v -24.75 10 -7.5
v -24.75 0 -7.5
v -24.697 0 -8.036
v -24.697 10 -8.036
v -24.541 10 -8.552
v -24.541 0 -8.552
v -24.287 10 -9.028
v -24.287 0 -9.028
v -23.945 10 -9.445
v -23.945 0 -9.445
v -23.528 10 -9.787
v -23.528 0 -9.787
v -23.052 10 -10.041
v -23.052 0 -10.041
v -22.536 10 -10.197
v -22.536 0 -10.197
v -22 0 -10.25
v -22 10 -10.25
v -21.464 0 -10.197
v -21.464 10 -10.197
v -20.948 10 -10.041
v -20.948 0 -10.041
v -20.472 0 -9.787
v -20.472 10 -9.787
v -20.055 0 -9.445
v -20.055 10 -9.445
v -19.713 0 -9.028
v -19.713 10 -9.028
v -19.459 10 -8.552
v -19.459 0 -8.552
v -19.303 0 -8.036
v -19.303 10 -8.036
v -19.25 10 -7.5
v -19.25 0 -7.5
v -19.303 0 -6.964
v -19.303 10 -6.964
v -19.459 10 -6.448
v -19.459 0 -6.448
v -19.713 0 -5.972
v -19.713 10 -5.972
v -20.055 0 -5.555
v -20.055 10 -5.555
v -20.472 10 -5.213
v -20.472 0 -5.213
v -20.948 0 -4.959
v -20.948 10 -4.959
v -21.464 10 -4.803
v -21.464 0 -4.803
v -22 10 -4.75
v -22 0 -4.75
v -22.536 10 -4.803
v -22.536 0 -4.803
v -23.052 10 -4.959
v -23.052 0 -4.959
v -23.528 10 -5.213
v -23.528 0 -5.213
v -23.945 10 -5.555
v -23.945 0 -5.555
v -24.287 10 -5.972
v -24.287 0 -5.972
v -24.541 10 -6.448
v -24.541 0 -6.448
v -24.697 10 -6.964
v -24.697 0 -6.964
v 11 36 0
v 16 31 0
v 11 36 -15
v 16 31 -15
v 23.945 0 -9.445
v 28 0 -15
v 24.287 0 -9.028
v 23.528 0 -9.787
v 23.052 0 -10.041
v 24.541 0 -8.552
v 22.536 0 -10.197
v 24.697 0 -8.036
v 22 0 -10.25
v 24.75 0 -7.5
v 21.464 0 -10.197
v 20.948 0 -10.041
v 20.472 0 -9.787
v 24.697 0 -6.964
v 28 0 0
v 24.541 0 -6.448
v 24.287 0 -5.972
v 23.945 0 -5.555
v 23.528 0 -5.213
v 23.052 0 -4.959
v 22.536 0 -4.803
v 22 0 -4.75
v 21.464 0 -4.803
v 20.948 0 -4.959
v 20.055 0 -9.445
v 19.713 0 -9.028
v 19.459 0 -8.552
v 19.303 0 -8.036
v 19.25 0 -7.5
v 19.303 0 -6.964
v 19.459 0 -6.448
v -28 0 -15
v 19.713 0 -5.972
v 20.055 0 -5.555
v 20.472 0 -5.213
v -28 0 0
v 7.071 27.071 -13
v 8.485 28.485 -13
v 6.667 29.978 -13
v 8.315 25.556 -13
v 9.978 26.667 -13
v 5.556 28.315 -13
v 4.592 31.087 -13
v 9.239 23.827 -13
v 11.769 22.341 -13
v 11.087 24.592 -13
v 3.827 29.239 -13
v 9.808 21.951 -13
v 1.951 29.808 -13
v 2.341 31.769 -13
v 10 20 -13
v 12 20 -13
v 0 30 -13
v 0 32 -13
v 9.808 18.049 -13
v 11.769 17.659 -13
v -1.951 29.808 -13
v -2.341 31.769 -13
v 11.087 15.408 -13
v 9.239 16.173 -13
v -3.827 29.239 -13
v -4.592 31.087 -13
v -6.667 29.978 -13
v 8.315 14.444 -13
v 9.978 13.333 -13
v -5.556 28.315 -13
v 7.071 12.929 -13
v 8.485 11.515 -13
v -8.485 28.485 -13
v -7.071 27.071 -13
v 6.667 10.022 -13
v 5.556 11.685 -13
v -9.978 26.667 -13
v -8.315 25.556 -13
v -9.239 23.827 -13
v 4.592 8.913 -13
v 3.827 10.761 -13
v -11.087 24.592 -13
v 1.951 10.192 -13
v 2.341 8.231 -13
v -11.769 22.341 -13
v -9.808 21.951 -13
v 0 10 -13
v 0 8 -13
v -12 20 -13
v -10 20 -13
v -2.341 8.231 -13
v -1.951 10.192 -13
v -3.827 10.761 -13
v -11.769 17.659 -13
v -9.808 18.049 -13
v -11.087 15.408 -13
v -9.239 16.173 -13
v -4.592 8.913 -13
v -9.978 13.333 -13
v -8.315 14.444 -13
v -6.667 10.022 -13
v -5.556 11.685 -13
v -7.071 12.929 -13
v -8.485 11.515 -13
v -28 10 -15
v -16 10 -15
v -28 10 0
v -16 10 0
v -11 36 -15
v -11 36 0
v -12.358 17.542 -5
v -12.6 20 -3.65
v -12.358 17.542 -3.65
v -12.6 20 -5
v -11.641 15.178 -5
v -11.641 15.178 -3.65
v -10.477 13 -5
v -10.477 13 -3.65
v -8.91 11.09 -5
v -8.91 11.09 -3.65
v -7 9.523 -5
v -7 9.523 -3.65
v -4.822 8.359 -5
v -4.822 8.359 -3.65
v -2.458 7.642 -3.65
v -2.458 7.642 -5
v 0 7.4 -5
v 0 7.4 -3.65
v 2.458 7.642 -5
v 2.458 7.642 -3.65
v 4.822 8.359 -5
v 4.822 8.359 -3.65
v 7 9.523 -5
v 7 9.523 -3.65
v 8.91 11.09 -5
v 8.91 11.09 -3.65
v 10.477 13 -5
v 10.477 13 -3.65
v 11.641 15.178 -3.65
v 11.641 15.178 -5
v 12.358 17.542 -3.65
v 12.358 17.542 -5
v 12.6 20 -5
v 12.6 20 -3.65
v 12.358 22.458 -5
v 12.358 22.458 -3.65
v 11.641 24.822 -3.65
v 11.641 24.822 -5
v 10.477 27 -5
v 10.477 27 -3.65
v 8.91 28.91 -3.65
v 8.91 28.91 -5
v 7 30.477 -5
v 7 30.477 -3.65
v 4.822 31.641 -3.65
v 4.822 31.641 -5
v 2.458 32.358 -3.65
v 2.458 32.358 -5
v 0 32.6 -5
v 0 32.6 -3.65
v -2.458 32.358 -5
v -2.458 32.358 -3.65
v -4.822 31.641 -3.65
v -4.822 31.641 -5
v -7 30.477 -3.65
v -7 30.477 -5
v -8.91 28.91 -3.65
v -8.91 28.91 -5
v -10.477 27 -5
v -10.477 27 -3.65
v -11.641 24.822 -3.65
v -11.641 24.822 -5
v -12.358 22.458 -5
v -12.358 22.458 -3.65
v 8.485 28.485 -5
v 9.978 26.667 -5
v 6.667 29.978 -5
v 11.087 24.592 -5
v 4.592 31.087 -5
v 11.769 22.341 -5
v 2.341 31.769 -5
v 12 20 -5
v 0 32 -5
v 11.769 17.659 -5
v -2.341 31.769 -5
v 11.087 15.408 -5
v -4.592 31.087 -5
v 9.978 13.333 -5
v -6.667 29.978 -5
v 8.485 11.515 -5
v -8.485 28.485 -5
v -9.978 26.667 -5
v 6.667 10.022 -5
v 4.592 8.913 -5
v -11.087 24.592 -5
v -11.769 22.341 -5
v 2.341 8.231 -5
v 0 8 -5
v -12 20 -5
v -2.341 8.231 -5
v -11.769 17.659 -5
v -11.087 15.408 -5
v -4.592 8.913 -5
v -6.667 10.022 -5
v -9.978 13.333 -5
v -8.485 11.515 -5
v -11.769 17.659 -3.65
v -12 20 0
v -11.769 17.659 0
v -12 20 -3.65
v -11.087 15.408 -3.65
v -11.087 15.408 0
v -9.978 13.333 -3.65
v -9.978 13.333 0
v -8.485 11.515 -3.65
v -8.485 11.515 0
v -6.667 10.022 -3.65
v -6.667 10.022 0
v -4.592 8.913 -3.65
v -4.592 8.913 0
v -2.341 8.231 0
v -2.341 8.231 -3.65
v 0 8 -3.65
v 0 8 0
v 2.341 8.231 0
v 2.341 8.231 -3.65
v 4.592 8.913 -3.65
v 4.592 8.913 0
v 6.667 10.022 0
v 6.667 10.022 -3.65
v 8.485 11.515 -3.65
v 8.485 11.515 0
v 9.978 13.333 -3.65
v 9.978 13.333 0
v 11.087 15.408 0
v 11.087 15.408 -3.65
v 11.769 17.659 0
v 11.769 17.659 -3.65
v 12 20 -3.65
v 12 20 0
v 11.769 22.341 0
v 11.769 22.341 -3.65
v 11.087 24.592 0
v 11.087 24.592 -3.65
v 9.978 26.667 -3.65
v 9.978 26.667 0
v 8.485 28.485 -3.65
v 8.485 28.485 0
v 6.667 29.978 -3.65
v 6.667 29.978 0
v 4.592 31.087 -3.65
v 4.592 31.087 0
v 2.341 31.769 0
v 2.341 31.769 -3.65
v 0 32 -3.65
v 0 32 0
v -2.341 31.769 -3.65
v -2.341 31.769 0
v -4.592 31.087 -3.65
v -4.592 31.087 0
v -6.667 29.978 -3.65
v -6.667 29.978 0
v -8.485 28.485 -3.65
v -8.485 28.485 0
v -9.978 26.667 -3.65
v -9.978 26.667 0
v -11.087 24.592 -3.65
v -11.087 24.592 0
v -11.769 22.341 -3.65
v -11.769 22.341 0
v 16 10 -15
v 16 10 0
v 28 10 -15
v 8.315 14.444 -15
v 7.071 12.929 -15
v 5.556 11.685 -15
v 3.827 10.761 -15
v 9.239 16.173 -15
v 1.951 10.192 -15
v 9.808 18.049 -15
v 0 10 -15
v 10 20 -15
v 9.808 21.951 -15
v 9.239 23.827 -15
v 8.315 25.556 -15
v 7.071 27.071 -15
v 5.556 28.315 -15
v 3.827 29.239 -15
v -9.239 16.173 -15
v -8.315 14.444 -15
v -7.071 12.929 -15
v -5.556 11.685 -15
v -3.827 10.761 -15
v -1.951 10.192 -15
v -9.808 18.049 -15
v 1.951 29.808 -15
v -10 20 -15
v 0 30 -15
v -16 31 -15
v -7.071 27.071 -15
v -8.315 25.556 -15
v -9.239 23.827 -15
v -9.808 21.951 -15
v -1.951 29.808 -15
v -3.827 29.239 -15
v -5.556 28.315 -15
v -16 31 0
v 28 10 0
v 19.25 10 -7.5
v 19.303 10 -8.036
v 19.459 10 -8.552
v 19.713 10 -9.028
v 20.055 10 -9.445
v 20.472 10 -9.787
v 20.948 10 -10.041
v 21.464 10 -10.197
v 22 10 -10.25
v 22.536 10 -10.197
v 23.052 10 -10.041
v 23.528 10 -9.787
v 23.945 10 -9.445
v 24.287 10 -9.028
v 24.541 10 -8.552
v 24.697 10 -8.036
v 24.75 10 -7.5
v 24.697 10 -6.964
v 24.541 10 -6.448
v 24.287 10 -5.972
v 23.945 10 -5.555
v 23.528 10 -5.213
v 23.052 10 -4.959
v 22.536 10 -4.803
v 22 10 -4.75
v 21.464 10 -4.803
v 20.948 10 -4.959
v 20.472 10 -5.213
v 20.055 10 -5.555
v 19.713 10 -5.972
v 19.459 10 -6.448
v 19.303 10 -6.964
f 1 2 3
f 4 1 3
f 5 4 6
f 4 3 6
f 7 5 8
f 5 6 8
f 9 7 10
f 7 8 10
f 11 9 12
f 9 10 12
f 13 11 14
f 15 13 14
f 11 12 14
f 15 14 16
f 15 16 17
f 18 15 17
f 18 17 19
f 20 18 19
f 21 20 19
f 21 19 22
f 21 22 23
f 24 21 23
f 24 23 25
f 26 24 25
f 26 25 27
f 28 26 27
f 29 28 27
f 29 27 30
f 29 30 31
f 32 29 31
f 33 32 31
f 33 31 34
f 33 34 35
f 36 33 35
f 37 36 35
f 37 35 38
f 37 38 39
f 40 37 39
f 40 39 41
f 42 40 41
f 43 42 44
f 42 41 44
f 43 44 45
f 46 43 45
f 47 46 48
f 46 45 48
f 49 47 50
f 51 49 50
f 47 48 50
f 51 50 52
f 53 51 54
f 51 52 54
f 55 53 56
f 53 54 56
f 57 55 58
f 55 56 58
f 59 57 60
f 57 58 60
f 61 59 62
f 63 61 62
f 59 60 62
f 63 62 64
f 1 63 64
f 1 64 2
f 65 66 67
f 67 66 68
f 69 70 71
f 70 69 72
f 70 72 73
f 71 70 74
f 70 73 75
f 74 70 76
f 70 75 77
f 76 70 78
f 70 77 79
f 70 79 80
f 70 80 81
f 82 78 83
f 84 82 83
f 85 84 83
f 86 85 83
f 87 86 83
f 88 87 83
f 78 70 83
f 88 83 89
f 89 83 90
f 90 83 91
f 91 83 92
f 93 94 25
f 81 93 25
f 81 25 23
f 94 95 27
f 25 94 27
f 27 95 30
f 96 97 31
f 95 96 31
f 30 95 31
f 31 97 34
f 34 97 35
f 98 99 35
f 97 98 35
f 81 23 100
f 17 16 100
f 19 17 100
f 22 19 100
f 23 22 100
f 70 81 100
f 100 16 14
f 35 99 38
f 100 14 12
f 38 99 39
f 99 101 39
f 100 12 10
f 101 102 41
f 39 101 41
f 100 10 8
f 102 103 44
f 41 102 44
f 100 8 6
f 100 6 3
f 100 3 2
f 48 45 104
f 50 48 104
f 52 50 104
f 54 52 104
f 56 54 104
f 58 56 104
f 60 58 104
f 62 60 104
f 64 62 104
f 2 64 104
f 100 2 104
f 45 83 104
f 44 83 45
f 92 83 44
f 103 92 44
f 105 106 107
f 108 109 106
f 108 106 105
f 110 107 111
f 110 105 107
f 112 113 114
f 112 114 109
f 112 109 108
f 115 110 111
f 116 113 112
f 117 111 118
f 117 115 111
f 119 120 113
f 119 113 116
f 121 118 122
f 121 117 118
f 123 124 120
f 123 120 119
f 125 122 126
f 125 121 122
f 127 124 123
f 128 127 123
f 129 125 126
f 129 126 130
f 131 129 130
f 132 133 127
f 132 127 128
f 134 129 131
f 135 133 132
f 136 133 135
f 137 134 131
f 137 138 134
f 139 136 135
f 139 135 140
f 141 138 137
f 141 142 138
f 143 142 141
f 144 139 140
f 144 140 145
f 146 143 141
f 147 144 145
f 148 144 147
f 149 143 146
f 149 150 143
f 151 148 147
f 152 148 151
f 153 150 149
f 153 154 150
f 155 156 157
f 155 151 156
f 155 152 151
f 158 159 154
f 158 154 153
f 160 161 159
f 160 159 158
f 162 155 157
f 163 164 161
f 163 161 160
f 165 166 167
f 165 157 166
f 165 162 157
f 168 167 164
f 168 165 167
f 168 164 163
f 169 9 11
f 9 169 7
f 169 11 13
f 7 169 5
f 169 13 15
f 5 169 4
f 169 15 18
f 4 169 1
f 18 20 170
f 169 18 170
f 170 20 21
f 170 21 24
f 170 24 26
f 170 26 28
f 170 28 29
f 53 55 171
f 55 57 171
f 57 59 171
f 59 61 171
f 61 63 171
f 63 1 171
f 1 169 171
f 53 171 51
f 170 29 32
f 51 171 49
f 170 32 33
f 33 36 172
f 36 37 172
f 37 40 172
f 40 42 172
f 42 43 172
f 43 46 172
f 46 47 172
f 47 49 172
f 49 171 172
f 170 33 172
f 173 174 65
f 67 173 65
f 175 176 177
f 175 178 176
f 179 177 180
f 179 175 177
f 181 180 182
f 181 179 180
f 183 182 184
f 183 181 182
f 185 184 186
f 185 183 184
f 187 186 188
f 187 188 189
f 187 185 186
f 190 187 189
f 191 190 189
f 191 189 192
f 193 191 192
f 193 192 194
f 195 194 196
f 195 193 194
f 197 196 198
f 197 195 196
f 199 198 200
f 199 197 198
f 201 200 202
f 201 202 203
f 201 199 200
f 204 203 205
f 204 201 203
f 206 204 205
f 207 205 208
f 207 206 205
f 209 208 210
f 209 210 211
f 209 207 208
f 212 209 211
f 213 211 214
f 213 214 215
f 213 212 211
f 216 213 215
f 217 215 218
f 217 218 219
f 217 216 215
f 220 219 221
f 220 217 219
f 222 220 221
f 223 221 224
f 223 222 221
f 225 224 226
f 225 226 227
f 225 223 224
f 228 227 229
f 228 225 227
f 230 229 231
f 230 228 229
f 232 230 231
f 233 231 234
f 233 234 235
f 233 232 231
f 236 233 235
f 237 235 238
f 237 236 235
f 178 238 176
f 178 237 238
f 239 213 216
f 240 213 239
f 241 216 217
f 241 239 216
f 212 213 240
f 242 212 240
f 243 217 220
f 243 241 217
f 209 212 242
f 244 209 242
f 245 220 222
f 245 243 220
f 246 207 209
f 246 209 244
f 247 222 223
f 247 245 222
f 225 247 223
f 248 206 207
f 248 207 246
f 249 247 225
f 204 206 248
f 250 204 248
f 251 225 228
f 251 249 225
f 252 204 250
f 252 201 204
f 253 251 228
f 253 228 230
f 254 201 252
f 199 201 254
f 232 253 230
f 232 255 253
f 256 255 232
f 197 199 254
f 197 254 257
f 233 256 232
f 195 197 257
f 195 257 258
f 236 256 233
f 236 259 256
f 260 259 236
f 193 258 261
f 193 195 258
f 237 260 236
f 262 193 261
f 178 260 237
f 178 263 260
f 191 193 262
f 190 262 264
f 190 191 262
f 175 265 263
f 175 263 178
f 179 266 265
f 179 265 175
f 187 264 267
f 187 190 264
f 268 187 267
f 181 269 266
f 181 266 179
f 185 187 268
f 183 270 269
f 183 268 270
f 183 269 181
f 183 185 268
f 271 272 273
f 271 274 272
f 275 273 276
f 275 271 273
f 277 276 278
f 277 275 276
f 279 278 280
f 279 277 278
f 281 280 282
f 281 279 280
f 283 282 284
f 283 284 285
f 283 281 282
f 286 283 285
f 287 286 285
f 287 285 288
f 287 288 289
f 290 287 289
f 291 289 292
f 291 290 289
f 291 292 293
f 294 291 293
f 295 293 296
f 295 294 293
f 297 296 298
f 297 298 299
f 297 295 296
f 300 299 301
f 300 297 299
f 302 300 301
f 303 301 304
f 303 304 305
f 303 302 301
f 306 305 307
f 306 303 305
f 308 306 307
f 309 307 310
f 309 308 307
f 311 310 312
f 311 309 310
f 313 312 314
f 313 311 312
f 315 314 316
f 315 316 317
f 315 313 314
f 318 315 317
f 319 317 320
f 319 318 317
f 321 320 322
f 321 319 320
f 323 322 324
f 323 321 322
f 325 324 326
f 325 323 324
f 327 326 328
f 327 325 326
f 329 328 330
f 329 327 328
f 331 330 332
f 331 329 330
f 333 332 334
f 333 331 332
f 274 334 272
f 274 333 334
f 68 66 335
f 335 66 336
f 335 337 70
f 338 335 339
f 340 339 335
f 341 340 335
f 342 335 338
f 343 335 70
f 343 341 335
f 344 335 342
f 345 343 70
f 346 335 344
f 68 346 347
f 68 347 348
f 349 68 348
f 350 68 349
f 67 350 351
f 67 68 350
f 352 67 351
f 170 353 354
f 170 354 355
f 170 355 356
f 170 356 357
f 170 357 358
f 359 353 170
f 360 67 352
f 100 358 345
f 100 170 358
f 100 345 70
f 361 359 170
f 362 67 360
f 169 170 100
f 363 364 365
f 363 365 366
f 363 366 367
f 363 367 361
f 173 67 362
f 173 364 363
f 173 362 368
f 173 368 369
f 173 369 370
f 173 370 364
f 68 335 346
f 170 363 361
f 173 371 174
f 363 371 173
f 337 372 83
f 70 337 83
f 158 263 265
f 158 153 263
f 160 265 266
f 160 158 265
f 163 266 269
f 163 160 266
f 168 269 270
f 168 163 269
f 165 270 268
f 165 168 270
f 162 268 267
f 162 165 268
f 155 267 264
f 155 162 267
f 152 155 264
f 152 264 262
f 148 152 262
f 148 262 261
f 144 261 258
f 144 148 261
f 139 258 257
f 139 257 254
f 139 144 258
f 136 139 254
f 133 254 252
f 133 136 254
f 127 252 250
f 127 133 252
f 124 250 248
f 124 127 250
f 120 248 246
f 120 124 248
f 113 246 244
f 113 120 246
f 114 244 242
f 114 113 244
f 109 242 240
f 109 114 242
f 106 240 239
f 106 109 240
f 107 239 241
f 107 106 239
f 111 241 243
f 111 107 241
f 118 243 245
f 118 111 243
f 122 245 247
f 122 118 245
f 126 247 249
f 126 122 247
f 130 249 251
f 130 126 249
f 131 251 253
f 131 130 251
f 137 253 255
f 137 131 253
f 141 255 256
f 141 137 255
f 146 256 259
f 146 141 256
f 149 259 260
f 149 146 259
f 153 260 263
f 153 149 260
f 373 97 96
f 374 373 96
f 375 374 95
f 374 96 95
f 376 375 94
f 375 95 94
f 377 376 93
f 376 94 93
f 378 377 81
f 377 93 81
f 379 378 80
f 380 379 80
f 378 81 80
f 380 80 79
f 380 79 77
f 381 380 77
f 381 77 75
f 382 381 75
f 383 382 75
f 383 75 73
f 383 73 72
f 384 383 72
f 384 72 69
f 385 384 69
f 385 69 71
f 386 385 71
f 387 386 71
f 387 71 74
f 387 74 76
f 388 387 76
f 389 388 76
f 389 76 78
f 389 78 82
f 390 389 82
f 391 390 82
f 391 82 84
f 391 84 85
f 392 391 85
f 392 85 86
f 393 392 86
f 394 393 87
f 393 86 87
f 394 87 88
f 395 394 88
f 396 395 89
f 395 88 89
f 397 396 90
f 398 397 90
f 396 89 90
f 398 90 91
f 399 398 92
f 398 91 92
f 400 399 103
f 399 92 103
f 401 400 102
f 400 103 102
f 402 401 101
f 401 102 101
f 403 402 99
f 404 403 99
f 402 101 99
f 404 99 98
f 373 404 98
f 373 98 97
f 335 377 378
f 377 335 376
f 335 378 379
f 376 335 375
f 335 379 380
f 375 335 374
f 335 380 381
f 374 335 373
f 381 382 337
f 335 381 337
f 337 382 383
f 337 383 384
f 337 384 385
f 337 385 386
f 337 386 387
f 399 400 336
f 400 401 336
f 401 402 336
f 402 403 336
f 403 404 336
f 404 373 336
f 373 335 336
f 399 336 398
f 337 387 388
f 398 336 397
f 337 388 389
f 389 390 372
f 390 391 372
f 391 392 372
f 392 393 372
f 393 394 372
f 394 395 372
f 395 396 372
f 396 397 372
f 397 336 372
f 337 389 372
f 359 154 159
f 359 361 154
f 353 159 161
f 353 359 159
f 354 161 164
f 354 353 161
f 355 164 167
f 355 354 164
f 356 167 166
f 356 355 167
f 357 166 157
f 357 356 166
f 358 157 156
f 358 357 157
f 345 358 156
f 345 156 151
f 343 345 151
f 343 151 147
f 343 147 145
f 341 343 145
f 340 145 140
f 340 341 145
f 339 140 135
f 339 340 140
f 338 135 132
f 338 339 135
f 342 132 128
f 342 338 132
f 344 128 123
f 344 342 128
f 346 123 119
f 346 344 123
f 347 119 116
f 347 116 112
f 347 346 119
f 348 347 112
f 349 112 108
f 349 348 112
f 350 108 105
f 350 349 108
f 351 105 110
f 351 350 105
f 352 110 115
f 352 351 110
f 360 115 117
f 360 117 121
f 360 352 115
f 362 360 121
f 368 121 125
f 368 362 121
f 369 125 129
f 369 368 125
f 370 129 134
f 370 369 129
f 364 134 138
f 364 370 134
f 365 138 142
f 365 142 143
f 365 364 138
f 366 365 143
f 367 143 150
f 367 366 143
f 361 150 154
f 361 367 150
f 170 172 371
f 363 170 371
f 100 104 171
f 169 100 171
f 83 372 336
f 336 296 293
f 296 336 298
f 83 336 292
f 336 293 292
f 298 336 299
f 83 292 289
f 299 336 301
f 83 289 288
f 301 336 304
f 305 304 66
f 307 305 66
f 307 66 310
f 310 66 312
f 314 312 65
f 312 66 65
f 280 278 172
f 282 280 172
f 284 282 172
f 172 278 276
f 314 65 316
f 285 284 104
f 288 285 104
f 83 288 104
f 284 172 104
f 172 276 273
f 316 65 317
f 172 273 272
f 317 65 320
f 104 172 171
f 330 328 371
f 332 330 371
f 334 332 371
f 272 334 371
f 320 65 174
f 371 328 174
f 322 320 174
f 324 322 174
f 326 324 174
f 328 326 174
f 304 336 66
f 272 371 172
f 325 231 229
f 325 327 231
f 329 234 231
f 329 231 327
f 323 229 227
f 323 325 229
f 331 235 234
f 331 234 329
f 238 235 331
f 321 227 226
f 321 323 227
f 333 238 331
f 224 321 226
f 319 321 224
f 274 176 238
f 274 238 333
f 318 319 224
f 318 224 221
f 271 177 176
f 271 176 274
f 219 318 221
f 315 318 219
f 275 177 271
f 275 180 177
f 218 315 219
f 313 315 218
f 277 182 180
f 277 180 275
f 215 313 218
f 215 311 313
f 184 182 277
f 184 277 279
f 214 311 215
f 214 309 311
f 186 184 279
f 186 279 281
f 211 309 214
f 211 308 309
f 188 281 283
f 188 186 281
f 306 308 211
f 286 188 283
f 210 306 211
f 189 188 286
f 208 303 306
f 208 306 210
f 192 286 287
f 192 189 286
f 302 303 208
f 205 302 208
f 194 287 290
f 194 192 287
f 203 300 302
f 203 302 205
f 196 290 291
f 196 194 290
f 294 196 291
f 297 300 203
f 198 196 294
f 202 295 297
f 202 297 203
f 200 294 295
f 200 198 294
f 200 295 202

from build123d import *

# Parameters (mm, degrees)
BOSS_EXTRUDE1_DEPTH = 15
DIAMETER_HOLE1_D    = 5.5
CHAMFER1_SIZE       = 5


with BuildPart() as part:
    # Sketch1 → Boss-Extrude1 (new body)
    with BuildSketch(Plane.XY):
        Polygon((-16, 36), (16, 36), (16, 10), (28, 10), (28, 0), (-28, 0), (-28, 10), (-16, 10), align=None)
    extrude(amount=-BOSS_EXTRUDE1_DEPTH)

    # Sketch2 → Cut-Revolve1 (revolve, cut)
    with BuildSketch(Plane(origin=(0, 0, 0), x_dir=(0, 0, -1), z_dir=(1, 0, 0))):
        Polygon((3.65, 32), (3.65, 32.6), (5, 32.6), (5, 32), (13, 32), (13, 30), (15, 30), (15, 20), (0, 20), (0, 32), align=None)
    revolve(axis=Axis((0, 20, -15), (0, 0, 1)), mode=Mode.SUBTRACT)

    # Diameter Hole1 (through all)
    with Locations(Plane(origin=(0, 10, 0), x_dir=(1, 0, 0), z_dir=(0, 1, 0))):
        with Locations((-22, 7.5), (22, 7.5)):
            Hole(DIAMETER_HOLE1_D / 2)

    # Chamfer1
    chamfer1_edges = [part.edges().sort_by_distance(p)[0] for p in [
        (-16, 36, -7.5),
        (16, 36, -7.5),
    ]]
    chamfer(chamfer1_edges, length=CHAMFER1_SIZE)


solid = part.part
